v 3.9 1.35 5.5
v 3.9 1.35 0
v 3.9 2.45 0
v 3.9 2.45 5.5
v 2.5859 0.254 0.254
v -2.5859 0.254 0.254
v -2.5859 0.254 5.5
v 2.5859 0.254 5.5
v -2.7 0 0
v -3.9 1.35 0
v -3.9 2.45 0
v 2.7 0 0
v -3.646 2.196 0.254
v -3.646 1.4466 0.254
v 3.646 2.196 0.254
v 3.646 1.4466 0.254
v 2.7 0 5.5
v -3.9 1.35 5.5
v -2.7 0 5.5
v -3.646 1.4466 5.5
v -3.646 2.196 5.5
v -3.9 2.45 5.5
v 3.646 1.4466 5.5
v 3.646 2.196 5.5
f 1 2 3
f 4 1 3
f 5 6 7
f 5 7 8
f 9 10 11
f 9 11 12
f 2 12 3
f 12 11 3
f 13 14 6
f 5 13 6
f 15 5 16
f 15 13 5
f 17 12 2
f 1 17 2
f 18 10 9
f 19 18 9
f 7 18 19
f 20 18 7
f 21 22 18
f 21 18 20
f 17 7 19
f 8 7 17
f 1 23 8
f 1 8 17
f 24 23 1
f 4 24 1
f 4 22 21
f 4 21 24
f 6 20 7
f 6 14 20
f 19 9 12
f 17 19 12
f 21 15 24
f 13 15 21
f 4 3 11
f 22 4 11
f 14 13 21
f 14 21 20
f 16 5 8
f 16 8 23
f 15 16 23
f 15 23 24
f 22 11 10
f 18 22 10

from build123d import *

# Parameters (mm, degrees)
BOSS_EXTRUDE1_DEPTH = 5.5
SHELL1_T            = -0.254


with BuildPart() as part:
    # Sketch1 → Boss-Extrude1 (new body)
    with BuildSketch(Plane.XY):
        Polygon((-2.7, 0), (2.7, 0), (3.9, 1.35), (3.9, 2.45), (-3.9, 2.45), (-3.9, 1.35), align=None)
    extrude(amount=BOSS_EXTRUDE1_DEPTH)

    # Shell1
    shell1_openings = [part.faces().sort_by_distance(p)[0] for p in [
        (0, 1.266666667, 5.5),
    ]]
    offset(amount=SHELL1_T, openings=shell1_openings, kind=Kind.INTERSECTION)


solid = part.part
